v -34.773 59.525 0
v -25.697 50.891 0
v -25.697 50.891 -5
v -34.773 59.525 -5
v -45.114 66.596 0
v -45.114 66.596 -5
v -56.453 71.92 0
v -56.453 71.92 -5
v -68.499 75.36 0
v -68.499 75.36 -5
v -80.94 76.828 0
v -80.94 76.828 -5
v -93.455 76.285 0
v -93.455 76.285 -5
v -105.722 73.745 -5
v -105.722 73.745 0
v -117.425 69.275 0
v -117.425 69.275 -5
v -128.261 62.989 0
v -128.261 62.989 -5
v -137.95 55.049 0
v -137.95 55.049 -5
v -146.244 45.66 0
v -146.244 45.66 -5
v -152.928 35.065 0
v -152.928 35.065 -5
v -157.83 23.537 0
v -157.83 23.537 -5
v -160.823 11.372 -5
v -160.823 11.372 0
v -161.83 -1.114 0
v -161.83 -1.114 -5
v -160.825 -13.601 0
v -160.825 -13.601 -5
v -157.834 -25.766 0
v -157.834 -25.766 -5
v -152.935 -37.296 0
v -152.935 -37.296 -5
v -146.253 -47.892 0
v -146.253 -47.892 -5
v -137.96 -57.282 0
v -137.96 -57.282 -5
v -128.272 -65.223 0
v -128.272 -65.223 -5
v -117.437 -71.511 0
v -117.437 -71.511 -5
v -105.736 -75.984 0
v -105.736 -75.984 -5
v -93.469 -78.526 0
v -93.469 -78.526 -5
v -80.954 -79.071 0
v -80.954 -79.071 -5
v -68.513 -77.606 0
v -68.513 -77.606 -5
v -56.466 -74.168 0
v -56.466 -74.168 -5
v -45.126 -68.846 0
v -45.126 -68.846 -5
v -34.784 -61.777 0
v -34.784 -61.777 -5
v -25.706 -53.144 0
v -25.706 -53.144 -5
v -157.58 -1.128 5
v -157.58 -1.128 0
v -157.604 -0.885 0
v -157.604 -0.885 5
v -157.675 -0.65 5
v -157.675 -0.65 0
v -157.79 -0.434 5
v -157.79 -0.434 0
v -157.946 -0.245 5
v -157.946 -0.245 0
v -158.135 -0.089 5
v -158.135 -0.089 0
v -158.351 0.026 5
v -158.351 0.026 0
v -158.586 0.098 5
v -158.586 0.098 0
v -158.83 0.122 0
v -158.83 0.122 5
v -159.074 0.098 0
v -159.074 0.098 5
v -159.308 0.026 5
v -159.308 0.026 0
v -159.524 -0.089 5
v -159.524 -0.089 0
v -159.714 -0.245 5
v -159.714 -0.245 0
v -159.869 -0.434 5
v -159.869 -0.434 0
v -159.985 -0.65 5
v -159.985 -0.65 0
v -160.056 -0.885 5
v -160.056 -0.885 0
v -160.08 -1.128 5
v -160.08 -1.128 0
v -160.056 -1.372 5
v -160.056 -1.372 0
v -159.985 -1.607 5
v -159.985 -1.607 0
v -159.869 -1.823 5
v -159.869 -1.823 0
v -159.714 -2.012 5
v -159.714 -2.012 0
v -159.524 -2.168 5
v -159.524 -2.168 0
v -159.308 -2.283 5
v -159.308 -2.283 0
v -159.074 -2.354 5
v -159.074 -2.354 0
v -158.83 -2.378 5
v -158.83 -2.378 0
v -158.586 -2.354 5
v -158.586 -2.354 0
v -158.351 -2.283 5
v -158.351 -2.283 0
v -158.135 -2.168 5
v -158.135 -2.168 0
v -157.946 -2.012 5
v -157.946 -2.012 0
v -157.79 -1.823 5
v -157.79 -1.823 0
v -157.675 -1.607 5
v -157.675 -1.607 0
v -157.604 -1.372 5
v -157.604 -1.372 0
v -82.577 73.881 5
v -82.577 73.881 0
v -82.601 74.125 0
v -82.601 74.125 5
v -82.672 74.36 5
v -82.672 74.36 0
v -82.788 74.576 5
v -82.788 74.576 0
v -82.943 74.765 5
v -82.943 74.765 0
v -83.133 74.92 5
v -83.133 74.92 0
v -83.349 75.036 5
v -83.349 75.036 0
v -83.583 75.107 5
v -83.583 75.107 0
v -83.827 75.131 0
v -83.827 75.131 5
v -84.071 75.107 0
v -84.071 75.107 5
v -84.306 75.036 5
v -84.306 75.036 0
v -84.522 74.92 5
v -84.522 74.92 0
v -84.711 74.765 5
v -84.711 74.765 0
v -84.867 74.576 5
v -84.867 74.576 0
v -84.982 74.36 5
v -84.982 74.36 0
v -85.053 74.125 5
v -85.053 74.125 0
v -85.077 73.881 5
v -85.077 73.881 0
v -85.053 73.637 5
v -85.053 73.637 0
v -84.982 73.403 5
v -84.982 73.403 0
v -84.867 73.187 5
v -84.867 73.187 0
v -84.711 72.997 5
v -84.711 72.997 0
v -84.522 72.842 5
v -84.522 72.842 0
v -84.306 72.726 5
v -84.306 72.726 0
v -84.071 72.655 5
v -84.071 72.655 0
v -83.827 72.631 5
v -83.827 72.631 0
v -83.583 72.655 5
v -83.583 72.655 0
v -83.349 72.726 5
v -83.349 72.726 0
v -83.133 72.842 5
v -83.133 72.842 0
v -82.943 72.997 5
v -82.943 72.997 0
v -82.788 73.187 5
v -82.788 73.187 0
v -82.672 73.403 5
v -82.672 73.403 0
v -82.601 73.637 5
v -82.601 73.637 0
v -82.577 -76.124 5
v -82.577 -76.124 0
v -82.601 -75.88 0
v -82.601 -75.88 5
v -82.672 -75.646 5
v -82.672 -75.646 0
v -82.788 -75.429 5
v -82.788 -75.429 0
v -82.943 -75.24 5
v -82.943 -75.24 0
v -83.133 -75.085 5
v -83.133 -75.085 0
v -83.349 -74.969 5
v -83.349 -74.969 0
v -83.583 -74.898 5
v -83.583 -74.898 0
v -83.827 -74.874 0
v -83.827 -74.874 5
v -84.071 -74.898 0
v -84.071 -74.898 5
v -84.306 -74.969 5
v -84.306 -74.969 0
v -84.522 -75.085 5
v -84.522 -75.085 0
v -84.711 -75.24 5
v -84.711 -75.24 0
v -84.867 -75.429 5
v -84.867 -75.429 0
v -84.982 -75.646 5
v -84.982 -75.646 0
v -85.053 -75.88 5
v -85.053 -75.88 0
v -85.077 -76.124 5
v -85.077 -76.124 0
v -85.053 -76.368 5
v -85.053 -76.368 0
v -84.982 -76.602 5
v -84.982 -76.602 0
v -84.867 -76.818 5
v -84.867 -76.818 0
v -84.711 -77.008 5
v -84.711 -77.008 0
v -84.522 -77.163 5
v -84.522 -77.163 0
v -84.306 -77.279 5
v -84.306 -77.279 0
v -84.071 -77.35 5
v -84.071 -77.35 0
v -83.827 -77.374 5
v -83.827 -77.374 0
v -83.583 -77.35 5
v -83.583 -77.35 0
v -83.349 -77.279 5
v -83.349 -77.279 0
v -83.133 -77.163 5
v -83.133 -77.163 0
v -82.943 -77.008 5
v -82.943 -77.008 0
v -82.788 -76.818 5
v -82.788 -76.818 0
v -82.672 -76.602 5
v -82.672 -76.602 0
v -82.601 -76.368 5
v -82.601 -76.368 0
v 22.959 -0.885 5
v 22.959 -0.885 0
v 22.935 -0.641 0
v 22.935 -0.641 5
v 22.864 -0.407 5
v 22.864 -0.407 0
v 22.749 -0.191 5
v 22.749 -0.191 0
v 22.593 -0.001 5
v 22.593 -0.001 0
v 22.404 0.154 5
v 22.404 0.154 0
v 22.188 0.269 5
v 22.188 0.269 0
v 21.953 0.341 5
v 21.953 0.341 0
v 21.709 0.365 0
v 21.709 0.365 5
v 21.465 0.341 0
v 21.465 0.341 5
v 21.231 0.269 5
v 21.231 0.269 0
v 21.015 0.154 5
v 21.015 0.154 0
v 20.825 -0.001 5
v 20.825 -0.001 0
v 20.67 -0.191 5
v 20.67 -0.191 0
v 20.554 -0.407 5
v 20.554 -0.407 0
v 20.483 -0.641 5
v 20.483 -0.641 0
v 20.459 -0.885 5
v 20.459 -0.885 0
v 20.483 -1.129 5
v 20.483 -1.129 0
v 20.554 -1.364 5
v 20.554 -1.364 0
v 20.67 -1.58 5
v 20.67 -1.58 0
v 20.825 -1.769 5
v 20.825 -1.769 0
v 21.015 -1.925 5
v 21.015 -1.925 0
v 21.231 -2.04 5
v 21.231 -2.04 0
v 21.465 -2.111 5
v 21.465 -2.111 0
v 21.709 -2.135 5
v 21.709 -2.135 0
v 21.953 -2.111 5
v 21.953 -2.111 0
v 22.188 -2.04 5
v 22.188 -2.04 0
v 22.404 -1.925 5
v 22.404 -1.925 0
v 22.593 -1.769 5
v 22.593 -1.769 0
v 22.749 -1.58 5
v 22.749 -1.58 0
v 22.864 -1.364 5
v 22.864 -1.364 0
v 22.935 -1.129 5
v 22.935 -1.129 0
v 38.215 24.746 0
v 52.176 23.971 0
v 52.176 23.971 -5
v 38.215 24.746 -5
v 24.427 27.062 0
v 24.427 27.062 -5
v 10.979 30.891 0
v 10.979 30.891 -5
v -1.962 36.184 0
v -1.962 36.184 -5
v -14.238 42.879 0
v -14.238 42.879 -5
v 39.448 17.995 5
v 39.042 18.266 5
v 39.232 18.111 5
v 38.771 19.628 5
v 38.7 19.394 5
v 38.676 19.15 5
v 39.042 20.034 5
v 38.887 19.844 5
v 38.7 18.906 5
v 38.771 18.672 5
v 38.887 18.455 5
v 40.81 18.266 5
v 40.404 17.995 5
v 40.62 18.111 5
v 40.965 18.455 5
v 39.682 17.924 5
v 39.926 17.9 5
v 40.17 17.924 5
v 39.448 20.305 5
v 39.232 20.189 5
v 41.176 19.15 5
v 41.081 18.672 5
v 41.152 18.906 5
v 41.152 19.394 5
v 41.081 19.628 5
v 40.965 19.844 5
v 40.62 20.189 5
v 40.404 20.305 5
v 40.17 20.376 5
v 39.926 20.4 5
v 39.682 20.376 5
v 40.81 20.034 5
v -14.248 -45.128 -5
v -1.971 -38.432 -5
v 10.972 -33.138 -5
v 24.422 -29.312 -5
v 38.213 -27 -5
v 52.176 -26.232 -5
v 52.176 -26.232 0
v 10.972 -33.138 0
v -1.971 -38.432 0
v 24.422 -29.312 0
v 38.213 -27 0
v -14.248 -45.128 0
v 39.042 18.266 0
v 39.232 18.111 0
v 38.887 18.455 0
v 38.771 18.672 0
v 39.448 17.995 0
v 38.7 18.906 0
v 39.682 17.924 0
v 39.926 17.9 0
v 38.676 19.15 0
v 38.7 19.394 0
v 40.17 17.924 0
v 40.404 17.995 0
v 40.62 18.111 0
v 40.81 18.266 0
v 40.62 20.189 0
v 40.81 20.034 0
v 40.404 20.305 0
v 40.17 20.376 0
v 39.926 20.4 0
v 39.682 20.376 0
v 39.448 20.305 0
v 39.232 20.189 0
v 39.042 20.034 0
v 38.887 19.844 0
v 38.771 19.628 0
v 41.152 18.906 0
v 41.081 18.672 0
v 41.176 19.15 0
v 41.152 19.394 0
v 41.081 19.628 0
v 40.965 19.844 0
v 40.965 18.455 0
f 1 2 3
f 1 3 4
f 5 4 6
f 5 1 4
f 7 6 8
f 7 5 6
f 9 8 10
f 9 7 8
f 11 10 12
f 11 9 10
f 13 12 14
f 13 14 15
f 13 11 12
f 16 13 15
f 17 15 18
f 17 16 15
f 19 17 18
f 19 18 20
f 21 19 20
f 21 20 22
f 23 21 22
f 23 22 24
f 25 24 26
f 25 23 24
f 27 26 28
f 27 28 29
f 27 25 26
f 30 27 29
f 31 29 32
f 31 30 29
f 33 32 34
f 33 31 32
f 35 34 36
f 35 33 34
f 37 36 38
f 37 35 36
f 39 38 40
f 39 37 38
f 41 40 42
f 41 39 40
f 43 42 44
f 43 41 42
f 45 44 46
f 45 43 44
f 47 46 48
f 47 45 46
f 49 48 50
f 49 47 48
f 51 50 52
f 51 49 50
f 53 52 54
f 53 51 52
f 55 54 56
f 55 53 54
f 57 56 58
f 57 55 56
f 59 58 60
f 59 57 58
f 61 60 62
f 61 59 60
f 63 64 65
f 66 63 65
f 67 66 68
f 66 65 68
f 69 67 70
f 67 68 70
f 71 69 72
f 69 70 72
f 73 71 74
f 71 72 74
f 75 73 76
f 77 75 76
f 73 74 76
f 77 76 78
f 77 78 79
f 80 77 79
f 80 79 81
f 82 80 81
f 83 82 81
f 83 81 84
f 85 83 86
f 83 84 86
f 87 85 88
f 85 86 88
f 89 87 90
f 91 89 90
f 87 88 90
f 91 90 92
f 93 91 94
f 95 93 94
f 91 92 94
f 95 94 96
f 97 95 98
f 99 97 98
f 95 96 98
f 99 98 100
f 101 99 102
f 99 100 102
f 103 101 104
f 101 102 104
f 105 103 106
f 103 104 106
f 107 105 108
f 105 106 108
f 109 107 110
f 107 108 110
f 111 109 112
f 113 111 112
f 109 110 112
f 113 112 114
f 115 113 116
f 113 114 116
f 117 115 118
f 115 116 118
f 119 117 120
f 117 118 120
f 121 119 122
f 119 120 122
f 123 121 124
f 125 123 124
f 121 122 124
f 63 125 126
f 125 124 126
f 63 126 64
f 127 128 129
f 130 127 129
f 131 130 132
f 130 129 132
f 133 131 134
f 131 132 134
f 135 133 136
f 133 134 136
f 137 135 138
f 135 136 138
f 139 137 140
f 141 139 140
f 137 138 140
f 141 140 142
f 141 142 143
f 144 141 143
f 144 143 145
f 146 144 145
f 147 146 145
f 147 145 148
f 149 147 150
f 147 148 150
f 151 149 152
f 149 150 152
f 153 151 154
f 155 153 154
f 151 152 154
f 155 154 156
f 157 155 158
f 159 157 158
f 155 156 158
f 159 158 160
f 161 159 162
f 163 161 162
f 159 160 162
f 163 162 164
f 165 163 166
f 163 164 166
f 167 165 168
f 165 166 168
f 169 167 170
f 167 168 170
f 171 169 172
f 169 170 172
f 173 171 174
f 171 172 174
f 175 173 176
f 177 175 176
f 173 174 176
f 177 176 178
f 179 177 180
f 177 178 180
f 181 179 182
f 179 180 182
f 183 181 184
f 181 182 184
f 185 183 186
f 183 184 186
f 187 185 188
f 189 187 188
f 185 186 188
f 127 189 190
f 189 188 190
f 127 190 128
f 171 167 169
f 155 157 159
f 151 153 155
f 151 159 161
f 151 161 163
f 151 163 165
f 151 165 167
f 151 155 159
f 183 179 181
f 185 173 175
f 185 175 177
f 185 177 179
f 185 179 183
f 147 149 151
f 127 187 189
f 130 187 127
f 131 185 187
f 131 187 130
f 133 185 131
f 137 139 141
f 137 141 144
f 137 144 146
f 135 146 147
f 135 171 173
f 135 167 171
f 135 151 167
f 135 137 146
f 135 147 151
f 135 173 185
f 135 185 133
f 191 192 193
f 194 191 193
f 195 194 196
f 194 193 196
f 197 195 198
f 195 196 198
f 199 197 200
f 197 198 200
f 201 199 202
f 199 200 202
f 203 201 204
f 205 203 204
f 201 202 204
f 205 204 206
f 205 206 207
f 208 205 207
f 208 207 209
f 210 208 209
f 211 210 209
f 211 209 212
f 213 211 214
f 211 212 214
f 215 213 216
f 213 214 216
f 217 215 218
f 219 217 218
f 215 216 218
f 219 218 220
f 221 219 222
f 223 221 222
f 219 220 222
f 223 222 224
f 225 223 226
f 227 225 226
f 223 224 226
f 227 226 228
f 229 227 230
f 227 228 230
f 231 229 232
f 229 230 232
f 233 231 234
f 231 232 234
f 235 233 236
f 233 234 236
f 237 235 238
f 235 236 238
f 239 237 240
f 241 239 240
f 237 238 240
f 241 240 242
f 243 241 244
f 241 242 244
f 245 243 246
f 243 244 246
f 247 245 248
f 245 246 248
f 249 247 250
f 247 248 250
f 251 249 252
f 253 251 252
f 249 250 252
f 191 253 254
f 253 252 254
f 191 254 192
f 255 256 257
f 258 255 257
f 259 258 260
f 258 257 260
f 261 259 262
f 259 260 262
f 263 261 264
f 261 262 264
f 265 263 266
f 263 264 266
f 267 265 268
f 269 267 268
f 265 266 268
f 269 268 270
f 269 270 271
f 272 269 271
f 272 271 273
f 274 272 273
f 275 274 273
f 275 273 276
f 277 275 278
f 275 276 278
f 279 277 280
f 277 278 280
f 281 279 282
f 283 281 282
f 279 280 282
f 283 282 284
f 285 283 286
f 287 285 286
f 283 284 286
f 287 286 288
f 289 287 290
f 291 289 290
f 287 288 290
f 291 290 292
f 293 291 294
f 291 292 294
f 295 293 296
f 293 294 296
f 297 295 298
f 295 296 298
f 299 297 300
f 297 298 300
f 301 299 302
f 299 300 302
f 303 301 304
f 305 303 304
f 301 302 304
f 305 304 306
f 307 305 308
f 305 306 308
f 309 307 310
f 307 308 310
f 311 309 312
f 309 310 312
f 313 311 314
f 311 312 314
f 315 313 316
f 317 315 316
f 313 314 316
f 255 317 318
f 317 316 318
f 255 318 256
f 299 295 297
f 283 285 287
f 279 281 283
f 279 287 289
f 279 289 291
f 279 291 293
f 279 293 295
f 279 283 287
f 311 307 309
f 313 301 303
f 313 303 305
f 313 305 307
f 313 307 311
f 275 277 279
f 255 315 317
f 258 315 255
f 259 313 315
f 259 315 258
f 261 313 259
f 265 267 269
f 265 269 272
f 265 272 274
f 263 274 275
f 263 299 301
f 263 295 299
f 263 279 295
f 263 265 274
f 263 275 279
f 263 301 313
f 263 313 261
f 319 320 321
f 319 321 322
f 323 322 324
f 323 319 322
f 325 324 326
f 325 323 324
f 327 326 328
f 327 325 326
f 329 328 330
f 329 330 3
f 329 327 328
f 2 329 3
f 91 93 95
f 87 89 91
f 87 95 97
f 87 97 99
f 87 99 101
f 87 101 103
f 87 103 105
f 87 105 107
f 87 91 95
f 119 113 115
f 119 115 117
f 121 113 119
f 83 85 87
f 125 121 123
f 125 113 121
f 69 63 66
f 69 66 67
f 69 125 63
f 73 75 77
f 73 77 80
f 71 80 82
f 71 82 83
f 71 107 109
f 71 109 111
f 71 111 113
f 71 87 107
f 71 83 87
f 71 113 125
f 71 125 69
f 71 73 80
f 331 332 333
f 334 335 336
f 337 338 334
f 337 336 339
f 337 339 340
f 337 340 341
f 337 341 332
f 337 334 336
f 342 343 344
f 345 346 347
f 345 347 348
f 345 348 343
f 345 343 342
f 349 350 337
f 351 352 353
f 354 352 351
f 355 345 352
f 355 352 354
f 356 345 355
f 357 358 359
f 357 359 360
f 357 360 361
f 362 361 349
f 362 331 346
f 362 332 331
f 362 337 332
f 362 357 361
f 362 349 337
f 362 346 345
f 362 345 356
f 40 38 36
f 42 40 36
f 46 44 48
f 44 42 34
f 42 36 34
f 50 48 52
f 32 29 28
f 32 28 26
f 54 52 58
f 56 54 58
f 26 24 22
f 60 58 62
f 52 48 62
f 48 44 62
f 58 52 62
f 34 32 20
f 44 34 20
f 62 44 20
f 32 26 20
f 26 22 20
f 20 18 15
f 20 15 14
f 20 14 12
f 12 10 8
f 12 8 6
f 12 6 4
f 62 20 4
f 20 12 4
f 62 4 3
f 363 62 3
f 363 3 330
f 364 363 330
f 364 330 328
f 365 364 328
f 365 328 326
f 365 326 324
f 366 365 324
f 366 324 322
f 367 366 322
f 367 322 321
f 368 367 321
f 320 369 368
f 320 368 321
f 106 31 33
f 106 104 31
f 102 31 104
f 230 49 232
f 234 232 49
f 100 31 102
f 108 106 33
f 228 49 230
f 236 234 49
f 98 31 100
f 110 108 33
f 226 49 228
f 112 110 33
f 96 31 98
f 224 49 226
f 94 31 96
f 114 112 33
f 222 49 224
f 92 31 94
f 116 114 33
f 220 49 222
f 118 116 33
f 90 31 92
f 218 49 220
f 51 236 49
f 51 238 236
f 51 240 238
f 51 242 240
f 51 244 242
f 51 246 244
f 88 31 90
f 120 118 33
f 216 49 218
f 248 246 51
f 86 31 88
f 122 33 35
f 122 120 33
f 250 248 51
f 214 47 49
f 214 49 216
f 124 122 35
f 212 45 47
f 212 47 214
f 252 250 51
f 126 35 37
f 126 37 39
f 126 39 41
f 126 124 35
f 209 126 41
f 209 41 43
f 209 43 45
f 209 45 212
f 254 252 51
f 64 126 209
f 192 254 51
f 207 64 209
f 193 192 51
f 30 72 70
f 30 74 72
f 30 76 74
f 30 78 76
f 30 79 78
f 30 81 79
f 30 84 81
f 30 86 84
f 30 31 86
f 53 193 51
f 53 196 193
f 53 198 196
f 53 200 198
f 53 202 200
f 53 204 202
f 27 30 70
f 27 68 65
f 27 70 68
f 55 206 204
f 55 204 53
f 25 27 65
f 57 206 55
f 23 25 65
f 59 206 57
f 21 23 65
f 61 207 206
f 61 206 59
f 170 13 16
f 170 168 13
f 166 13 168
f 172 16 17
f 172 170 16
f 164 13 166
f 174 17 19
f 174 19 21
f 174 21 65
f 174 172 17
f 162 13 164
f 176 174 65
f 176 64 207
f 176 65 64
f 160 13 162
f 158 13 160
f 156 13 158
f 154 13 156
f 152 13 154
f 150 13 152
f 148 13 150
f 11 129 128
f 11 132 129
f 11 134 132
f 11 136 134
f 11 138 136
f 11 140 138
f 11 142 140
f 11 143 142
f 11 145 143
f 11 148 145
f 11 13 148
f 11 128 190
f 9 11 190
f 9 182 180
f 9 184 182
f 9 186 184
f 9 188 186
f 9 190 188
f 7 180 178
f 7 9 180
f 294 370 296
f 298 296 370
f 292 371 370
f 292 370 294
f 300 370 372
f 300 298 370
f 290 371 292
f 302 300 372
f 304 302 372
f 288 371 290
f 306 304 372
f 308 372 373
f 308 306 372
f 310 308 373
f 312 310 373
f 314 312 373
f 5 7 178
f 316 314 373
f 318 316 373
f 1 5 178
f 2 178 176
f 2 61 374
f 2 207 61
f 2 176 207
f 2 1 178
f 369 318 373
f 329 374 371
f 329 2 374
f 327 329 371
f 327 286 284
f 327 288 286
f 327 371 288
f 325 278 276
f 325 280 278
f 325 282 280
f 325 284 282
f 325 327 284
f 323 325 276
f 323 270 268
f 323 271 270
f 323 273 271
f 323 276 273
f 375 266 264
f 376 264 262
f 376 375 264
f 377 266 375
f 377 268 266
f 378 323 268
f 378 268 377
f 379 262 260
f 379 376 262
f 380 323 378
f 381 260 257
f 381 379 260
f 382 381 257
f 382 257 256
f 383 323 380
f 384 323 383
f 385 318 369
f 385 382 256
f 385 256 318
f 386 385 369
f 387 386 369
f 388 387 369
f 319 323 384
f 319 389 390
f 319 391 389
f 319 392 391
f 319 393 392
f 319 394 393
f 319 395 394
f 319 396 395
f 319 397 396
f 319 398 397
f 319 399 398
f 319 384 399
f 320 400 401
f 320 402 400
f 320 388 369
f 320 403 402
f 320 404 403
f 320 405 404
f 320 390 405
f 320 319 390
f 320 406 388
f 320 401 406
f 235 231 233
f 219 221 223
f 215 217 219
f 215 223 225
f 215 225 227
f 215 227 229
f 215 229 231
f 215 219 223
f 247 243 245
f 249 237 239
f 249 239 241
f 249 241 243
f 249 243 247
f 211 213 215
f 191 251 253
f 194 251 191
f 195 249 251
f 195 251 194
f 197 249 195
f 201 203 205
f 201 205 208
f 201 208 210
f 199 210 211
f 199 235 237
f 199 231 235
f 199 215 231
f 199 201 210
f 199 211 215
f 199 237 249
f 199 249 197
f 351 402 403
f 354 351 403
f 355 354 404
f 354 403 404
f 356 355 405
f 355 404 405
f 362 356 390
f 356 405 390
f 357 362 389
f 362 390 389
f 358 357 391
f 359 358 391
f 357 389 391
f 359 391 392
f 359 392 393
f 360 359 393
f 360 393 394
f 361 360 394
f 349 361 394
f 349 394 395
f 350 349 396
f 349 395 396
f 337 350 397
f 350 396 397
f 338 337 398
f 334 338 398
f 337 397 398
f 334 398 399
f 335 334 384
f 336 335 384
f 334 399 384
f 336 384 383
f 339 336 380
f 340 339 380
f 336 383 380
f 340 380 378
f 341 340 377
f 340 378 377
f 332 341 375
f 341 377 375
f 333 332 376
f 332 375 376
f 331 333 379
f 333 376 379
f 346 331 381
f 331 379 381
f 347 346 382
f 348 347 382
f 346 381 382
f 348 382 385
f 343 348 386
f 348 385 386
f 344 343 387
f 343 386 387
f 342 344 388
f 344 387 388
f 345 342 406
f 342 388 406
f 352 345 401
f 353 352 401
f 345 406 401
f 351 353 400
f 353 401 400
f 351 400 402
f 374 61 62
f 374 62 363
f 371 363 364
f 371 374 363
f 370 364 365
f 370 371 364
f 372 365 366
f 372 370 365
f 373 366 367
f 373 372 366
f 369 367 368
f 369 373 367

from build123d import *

# Parameters (mm, degrees)
F0_R     = 1.25
F1_DEPTH = 5
F2_DEPTH = 5
F3_DEPTH = 5


with BuildPart() as f1:
    # F0 (on Top) → F1 (new body)
    with BuildSketch(Plane.XY):
        with BuildLine():
            ThreePointArc((52.175985, 23.970867), (10.978788, 30.890651), (-25.696786, 50.89052))
            ThreePointArc((-25.696786, 50.89052), (-161.829837, -1.114364), (-25.706141, -53.143729))
            ThreePointArc((-25.706141, -53.143729), (10.971628, -33.137817), (52.175985, -26.231581))
            Line((52.175985, -26.231581), (52.175985, -1.131581))
            Line((52.175985, -1.131581), (52.175985, 23.970867))
        make_face()
        with Locations((-83.827306, -76.123909)):
            Circle(F0_R, mode=Mode.SUBTRACT)
        with Locations((-158.829837, -1.128392)):
            Circle(F0_R, mode=Mode.SUBTRACT)
        with Locations((-83.827306, 73.881153)):
            Circle(F0_R, mode=Mode.SUBTRACT)
        with Locations((21.709267, -0.885356)):
            Circle(F0_R, mode=Mode.SUBTRACT)
        with Locations((39.925987, 19.149961)):
            Circle(F0_R, mode=Mode.SUBTRACT)
    extrude(amount=-F1_DEPTH)


with BuildPart() as f2:
    # F0 (on Top) → F2 (new body)
    with BuildSketch(Plane.XY):
        with Locations((39.925987, 19.149961)):
            Circle(F0_R)
        with Locations((21.709267, -0.885356)):
            Circle(F0_R)
        with Locations((-83.827306, 73.881153)):
            Circle(F0_R)
        with Locations((-83.827306, -76.123909)):
            Circle(F0_R)
        with Locations((-158.829837, -1.128392)):
            Circle(F0_R)
    extrude(amount=F2_DEPTH)


with BuildPart() as f3:
    # F0 (on Top) → F3 (new body)
    with BuildSketch(Plane.XY):
        with Locations((-158.829837, -1.128392)):
            Circle(F0_R)
        with Locations((-83.827306, -76.123909)):
            Circle(F0_R)
        with Locations((-83.827306, 73.881153)):
            Circle(F0_R)
        with Locations((21.709267, -0.885356)):
            Circle(F0_R)
        with Locations((39.925987, 19.149961)):
            Circle(F0_R)
    extrude(amount=-F3_DEPTH)


with BuildPart() as f1_1:
    add(f1.part)

    # F4: union F2, F3
    add(f2.part)
    add(f3.part)


solid = f1_1.part
